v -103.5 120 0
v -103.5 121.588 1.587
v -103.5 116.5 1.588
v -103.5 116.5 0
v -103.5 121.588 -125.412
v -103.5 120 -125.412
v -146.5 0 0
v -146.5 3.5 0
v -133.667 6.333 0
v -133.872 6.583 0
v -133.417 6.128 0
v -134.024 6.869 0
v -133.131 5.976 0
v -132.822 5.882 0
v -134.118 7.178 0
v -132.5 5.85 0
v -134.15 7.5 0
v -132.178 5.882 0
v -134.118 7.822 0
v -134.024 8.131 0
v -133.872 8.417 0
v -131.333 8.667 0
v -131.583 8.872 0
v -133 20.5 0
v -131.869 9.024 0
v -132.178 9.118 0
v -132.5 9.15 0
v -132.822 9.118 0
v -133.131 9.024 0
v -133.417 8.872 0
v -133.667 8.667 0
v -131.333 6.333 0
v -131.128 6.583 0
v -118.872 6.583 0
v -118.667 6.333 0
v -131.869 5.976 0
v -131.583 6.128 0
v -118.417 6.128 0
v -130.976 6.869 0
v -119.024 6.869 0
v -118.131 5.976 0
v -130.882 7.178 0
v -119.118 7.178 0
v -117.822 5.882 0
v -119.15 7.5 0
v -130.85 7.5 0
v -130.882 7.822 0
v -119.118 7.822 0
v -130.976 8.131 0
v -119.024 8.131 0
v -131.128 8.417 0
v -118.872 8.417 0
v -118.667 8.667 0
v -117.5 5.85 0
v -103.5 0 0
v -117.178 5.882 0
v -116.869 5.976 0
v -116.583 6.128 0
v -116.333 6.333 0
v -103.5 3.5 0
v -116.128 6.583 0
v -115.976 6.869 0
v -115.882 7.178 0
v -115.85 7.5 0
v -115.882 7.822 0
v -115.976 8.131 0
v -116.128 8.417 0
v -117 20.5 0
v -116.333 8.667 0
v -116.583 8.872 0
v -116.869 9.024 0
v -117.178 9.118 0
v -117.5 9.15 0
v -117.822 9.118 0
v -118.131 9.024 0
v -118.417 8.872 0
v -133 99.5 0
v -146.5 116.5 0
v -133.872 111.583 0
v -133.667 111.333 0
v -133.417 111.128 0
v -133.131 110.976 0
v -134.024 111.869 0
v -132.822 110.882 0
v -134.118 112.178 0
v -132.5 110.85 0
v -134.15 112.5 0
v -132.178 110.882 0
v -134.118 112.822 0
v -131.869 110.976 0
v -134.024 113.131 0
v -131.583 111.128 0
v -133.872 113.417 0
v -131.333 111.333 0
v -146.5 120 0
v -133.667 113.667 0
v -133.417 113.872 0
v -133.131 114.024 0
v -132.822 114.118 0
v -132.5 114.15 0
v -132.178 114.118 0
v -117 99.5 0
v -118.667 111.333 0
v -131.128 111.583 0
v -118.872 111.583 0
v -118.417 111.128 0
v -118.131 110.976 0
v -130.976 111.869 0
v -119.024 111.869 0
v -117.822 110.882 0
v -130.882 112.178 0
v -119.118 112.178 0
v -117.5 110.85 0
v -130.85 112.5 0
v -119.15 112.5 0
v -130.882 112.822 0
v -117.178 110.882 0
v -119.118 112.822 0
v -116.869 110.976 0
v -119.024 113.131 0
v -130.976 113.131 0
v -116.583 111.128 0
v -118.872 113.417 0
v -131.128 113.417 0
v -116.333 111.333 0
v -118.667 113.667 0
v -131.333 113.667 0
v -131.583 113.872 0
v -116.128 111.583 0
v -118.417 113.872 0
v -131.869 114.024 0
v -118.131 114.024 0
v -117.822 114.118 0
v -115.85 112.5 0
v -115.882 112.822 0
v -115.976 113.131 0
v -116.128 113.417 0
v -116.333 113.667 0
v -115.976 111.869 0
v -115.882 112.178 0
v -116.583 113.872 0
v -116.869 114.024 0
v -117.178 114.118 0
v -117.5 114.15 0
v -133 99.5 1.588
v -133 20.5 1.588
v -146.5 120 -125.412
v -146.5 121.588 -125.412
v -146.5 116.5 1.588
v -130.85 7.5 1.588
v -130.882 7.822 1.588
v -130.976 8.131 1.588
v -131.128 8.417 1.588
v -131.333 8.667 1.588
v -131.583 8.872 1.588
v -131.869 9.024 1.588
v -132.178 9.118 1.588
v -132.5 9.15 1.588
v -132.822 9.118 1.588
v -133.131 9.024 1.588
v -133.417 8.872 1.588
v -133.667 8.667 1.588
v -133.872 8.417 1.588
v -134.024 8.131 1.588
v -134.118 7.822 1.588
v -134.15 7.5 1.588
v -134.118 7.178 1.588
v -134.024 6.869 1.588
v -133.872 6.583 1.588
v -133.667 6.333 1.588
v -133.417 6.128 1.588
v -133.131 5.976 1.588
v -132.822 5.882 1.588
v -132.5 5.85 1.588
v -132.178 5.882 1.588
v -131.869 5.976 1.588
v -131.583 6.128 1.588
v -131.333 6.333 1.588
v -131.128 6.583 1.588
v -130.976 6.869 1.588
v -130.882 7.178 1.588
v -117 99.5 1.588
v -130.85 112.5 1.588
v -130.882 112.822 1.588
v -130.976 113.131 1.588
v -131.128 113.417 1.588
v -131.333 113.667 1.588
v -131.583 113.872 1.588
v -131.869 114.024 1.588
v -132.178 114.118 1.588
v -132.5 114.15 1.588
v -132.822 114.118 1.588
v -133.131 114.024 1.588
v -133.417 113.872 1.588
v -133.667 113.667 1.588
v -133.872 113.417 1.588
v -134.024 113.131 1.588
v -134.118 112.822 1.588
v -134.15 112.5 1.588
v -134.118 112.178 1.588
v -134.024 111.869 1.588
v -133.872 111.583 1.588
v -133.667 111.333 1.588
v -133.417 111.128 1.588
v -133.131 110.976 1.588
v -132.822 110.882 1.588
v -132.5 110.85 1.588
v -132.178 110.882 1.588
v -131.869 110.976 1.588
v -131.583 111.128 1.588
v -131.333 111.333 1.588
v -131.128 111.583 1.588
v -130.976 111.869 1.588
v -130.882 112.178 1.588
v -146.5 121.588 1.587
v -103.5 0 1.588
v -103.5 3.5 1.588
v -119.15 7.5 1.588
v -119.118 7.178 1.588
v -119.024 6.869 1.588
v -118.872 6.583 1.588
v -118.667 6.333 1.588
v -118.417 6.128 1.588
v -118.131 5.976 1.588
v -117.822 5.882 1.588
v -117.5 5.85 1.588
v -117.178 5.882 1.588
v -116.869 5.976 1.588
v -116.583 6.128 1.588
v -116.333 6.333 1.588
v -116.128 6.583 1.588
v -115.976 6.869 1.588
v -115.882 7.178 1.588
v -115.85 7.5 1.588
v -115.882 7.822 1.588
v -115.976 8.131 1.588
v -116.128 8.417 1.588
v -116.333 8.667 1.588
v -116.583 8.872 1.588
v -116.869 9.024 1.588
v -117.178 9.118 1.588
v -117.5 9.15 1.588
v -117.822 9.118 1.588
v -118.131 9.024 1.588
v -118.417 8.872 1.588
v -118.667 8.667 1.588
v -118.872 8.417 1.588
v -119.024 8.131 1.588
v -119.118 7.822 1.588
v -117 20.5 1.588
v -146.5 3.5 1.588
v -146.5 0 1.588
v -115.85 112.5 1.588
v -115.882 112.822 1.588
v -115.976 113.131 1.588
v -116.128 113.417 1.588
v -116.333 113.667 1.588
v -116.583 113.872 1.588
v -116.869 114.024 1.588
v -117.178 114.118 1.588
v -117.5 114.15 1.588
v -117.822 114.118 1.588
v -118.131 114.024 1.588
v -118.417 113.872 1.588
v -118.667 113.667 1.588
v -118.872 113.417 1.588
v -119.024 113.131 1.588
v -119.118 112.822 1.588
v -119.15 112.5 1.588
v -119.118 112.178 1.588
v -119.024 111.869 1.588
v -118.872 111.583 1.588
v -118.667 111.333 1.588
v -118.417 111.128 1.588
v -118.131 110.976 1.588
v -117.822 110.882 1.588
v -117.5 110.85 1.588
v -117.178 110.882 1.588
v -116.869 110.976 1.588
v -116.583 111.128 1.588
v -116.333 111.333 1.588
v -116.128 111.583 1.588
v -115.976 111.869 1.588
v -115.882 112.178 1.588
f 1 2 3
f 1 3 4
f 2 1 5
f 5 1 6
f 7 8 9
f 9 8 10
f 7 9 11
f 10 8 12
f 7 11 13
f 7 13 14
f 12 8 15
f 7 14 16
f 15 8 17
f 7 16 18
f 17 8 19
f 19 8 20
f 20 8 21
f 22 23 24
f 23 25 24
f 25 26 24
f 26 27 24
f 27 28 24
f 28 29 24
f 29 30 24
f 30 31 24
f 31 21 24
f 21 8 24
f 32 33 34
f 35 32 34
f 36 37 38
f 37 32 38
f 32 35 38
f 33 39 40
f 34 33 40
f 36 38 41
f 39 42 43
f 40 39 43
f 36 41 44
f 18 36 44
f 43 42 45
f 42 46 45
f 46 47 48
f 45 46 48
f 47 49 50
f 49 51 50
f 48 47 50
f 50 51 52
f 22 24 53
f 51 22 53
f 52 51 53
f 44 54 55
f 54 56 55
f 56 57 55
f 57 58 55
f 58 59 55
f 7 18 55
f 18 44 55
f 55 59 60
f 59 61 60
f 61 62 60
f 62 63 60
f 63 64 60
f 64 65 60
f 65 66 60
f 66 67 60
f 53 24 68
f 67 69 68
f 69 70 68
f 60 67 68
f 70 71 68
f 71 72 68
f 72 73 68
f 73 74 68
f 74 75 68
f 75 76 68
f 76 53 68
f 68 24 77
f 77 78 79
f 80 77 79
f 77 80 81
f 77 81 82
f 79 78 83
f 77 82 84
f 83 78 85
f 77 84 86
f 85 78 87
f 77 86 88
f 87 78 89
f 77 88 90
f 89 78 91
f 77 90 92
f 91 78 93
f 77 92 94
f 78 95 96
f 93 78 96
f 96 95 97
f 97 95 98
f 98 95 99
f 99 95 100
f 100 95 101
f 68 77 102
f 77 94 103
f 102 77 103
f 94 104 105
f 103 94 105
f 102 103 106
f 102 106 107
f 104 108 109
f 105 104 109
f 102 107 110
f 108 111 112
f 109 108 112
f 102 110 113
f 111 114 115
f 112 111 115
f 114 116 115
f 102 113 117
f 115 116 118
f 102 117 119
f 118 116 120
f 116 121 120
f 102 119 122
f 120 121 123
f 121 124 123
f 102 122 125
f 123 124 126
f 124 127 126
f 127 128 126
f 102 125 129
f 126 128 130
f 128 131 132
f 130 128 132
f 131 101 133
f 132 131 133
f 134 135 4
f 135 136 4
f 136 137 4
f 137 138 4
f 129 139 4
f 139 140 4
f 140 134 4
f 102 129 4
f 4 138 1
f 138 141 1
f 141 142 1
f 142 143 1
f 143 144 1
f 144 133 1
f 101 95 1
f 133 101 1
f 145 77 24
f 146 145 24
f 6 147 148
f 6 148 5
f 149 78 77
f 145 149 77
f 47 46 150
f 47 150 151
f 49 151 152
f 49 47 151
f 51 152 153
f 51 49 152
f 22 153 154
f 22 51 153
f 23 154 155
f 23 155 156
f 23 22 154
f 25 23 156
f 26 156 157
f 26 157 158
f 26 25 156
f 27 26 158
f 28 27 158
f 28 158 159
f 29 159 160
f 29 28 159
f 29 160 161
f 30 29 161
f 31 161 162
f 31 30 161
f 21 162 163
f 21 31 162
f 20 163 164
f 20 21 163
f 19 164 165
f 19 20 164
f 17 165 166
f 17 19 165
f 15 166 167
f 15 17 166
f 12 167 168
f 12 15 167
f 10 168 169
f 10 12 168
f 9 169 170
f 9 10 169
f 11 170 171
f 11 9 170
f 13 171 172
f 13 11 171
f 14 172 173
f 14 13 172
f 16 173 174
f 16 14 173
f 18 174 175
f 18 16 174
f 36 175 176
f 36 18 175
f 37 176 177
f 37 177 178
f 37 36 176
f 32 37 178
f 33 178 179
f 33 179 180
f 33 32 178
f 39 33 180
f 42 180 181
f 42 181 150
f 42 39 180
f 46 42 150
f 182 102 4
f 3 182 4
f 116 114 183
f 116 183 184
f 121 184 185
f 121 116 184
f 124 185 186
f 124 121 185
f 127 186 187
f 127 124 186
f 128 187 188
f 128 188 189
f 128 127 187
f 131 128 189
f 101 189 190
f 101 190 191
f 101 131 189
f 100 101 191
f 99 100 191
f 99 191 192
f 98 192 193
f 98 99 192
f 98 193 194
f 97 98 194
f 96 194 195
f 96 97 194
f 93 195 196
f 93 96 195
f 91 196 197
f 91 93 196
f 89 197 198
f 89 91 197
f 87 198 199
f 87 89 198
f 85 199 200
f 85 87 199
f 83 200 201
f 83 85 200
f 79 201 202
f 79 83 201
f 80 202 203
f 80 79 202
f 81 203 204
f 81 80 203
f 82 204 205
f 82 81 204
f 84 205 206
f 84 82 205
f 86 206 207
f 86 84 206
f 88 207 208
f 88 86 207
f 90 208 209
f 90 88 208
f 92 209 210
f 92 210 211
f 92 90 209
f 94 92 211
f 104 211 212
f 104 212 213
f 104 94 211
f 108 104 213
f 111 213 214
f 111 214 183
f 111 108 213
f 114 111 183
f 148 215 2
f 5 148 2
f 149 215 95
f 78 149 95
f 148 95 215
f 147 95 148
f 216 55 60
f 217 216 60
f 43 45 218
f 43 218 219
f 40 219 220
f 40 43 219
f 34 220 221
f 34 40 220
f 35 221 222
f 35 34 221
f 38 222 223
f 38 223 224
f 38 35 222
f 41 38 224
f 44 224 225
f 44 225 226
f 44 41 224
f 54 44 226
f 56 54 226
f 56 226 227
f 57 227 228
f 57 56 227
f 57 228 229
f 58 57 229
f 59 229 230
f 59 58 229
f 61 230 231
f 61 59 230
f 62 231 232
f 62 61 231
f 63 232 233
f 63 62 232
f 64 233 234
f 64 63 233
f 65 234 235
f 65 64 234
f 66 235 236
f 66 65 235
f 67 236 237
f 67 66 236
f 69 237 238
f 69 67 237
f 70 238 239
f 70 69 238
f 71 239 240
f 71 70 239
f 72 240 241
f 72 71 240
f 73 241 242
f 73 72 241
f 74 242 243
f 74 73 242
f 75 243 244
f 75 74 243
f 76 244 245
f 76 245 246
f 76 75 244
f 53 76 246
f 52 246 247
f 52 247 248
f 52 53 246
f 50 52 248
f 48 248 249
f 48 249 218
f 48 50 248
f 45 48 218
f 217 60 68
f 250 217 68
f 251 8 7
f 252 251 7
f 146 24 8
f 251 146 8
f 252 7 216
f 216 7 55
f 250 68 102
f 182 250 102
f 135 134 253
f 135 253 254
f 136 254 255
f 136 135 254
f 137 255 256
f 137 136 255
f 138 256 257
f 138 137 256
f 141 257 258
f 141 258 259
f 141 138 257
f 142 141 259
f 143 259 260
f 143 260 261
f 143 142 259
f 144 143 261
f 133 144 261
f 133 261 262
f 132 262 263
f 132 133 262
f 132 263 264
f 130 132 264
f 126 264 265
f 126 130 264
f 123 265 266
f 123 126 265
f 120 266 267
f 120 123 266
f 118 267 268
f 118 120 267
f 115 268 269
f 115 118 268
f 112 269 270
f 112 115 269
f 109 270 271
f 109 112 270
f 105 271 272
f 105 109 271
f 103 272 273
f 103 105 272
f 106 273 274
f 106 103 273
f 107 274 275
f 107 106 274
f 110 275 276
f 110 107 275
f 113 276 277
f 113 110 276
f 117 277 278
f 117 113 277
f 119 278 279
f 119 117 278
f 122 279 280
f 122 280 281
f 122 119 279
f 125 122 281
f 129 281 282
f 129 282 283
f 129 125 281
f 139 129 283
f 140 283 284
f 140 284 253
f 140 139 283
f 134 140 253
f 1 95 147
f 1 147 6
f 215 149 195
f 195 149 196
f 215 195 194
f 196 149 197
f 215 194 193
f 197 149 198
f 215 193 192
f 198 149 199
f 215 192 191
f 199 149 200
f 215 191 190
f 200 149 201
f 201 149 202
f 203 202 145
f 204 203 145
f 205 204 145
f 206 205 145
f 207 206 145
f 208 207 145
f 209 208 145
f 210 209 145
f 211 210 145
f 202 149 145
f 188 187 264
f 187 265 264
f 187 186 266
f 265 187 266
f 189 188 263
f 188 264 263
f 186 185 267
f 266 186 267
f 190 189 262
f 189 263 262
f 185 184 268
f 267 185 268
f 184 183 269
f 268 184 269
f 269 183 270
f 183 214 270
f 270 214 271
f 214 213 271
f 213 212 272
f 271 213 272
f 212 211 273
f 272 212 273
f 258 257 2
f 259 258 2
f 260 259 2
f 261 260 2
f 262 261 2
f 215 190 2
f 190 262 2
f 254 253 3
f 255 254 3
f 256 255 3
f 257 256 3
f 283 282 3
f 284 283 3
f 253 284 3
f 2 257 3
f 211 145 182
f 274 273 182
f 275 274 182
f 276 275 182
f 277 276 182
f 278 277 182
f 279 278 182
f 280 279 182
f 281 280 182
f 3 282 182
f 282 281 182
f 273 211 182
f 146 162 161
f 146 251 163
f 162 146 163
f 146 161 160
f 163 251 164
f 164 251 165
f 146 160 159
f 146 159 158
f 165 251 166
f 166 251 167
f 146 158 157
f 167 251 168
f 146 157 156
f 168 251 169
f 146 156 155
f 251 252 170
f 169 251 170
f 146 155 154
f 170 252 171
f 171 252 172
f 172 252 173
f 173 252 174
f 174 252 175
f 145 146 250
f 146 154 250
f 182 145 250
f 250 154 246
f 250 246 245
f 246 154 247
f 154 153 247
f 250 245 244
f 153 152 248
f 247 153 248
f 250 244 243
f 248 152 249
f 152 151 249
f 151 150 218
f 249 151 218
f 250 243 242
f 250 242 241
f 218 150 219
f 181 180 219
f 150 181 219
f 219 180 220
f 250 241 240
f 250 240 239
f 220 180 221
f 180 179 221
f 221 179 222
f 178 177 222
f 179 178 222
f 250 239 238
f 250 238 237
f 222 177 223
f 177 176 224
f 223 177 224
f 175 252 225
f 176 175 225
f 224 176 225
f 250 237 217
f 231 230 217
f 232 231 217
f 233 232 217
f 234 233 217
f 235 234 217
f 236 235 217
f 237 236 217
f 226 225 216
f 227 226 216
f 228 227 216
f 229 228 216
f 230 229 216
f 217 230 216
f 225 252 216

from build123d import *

# Parameters (mm, degrees)
BOSS_EXTRUDE1_DEPTH = 1.5875
SKETCH2_W           = 43
SKETCH2_H           = 127
BOSS_EXTRUDE2_DEPTH = 1.5875


with BuildPart() as part:
    # Sketch1 → Boss-Extrude1 (new body)
    with BuildSketch(Plane.XY):
        Polygon((-117, 99.5), (-103.5, 116.5), (-103.5, 120), (-146.5, 120), (-146.5, 116.5), (-133, 99.5), (-133, 20.5), (-146.5, 3.5), (-146.5, 0), (-103.5, 0), (-103.5, 3.5), (-117, 20.5), align=None)
        with BuildLine():
            ThreePointArc((-134.15, 112.5), (-132.5, 110.85), (-130.85, 112.5))
            ThreePointArc((-130.85, 112.5), (-132.5, 114.15), (-134.15, 112.5))
        make_face(mode=Mode.SUBTRACT)
        with BuildLine():
            ThreePointArc((-119.15, 112.5), (-117.5, 110.85), (-115.85, 112.5))
            ThreePointArc((-115.85, 112.5), (-117.5, 114.15), (-119.15, 112.5))
        make_face(mode=Mode.SUBTRACT)
        with BuildLine():
            ThreePointArc((-115.85, 7.5), (-117.5, 9.15), (-119.15, 7.5))
            ThreePointArc((-119.15, 7.5), (-117.5, 5.85), (-115.85, 7.5))
        make_face(mode=Mode.SUBTRACT)
        with BuildLine():
            ThreePointArc((-134.15, 7.5), (-132.5, 5.85), (-130.85, 7.5))
            ThreePointArc((-130.85, 7.5), (-132.5, 9.15), (-134.15, 7.5))
        make_face(mode=Mode.SUBTRACT)
    extrude(amount=BOSS_EXTRUDE1_DEPTH)

    # Sketch2 → Boss-Extrude2 (add)
    with BuildSketch(Plane(origin=(0, 120, 0), x_dir=(1, 0, 0), z_dir=(0, 1, 0))):
        with Locations((-125, 61.9125)):
            Rectangle(SKETCH2_W, SKETCH2_H)
    extrude(amount=BOSS_EXTRUDE2_DEPTH)


solid = part.part
